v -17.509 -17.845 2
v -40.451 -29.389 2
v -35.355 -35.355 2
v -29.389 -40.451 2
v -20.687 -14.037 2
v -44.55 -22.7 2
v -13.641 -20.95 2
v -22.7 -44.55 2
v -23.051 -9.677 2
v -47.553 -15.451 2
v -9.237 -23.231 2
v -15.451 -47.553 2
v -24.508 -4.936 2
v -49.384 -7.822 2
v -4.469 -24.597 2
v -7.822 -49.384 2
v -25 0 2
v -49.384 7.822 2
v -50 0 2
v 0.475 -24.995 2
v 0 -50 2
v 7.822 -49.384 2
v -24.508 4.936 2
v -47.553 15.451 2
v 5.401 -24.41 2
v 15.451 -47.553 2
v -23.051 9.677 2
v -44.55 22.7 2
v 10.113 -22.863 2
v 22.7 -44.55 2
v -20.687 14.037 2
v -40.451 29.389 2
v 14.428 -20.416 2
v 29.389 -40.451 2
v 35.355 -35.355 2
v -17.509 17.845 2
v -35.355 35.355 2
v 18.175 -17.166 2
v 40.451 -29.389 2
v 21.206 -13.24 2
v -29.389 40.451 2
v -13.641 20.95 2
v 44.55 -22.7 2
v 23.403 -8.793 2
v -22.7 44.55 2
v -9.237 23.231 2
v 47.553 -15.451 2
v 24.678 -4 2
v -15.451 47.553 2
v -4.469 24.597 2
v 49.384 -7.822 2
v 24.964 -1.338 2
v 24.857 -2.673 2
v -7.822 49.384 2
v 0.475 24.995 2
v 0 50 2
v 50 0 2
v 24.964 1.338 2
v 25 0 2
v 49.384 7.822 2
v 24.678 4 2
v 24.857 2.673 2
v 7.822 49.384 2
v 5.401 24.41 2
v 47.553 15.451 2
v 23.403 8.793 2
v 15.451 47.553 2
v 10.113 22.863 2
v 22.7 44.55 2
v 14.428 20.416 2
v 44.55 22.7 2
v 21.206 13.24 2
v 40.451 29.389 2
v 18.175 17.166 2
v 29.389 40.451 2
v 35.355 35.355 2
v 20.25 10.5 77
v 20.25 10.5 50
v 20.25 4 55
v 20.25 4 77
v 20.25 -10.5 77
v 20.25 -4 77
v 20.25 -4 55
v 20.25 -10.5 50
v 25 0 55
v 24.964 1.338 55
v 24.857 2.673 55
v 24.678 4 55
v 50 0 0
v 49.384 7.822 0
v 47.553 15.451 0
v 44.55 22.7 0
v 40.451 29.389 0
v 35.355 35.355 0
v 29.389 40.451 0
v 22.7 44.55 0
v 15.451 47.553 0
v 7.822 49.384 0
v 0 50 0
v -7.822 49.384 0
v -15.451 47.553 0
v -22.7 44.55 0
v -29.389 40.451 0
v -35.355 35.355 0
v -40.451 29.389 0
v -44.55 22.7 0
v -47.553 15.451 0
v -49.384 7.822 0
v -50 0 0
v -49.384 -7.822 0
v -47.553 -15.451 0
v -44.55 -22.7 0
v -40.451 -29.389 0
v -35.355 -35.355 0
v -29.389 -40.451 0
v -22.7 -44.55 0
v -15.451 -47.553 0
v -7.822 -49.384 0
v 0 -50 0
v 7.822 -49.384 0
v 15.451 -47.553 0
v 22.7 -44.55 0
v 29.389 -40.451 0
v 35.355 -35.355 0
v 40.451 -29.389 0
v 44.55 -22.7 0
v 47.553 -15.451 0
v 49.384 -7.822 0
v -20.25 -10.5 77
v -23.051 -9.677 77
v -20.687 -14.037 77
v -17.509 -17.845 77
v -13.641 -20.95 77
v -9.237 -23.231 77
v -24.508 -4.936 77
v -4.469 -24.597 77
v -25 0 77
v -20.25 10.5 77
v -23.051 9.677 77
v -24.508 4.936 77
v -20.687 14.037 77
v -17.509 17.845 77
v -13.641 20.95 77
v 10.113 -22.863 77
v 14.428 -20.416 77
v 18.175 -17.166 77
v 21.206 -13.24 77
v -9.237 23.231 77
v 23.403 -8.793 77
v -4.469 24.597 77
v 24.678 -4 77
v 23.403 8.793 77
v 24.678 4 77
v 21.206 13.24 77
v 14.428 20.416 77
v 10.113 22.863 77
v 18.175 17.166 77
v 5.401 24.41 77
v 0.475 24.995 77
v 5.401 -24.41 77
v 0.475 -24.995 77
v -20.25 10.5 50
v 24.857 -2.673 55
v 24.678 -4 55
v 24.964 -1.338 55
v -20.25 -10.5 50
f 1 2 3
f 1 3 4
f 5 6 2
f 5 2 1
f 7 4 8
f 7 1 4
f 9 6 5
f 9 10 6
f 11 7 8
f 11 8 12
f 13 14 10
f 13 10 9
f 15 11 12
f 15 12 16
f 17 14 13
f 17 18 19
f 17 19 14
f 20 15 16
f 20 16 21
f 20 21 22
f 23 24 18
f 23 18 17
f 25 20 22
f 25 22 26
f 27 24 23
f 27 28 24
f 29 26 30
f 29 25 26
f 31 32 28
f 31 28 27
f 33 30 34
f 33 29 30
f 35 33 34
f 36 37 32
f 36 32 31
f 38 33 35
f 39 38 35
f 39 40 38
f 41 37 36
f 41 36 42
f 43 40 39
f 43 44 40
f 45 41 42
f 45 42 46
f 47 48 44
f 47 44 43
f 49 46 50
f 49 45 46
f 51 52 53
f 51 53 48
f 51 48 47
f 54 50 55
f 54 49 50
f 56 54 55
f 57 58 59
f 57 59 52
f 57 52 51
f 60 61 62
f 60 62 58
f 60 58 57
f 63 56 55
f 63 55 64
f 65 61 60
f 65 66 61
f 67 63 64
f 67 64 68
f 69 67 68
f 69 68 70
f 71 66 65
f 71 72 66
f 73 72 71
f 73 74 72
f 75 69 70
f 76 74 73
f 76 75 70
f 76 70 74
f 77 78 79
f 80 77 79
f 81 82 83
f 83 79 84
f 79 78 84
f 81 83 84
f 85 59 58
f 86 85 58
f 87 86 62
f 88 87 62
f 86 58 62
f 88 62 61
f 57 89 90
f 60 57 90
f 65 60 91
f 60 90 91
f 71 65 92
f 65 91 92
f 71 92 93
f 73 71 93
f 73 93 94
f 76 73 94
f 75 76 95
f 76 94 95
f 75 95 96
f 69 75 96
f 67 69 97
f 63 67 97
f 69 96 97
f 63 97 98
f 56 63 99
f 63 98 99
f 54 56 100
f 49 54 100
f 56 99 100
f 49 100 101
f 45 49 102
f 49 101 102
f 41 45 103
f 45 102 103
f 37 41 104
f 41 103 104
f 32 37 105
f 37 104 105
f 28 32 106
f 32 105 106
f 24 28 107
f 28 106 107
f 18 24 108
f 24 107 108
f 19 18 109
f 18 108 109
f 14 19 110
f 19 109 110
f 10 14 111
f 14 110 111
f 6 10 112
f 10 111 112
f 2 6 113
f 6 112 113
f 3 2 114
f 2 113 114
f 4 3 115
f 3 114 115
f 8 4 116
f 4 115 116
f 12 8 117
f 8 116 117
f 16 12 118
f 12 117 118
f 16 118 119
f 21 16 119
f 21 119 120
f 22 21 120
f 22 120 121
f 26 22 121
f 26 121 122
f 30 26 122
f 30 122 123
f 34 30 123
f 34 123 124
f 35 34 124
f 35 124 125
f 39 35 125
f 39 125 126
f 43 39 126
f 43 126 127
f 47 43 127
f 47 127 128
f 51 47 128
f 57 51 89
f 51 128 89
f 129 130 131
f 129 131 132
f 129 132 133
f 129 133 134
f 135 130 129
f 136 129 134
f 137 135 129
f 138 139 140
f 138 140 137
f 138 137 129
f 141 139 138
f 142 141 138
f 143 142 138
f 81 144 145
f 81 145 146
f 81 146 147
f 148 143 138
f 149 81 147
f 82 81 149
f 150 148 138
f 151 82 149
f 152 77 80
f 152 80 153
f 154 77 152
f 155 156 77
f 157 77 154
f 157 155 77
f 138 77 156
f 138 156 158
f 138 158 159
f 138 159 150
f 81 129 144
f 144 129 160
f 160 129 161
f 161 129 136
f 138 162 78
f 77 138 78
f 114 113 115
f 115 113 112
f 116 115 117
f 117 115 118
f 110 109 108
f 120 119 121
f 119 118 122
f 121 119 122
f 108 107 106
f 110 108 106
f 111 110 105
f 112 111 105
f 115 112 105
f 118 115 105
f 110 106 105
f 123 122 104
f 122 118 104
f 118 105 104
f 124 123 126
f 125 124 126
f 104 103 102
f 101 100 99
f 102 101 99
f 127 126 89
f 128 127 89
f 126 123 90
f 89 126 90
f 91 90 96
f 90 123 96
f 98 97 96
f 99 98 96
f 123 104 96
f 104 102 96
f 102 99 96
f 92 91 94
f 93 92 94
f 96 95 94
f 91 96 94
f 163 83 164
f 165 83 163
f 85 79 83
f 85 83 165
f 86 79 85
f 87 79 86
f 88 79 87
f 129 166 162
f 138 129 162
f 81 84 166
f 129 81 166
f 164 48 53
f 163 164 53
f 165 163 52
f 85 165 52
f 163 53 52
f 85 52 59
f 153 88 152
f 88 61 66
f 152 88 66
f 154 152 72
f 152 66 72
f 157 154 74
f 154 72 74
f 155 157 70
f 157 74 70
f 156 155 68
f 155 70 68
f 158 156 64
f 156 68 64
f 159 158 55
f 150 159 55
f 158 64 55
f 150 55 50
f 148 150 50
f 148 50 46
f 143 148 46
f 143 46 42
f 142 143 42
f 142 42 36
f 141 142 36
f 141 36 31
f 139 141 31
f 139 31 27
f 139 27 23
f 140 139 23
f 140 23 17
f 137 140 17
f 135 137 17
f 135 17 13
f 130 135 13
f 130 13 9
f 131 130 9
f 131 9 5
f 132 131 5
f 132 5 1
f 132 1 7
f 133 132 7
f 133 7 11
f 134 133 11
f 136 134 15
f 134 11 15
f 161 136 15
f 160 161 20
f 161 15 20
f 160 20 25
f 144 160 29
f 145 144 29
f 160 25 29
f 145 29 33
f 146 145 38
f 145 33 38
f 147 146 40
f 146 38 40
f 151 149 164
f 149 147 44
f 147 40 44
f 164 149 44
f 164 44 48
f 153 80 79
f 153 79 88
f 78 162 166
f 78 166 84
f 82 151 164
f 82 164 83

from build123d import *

# Parameters (mm, degrees)
SKETCH1_R           = 50
SKETCH1_R_2         = 25
BOSS_EXTRUDE1_DEPTH = 2
SKETCH1_3_W         = 40.5
SKETCH1_3_H         = 21
BOSS_EXTRUDE2_DEPTH = 50
BOSS_EXTRUDE3_DEPTH = 77
BOSS_EXTRUDE7_DEPTH = 55


with BuildPart() as part:
    # Sketch1 → Boss-Extrude1 (new body)
    with BuildSketch(Plane.XY):
        Circle(SKETCH1_R)
        Circle(SKETCH1_R_2, mode=Mode.SUBTRACT)
    extrude(amount=BOSS_EXTRUDE1_DEPTH)



with BuildPart() as body_2:
    # Sketch1<3> → Boss-Extrude2 (new body)
    with BuildSketch(Plane.XY):
        Rectangle(SKETCH1_3_W, SKETCH1_3_H)
    extrude(amount=BOSS_EXTRUDE2_DEPTH)


with BuildPart() as part_1:
    add(part.part)

    add(body_2.part)  # Boss-Extrude3 merges body 2
    # Sketch1<4> → Boss-Extrude3 (add)
    with BuildSketch(Plane.XY):
        with BuildLine():
            Line((-20.25, -10.5), (-20.25, 10.5))
            Line((-20.25, 10.5), (20.25, 10.5))
            Line((20.25, 10.5), (20.25, 4))
            Line((20.25, 4), (24.677925359, 4))
            ThreePointArc((24.677925359, 4), (-25, 0), (24.677925359, -4))
            Line((24.677925359, -4), (20.25, -4))
            Line((20.25, -4), (20.25, -10.5))
            Line((20.25, -10.5), (-20.25, -10.5))
        make_face()
    extrude(amount=BOSS_EXTRUDE3_DEPTH)

    # Sketch1<7> → Boss-Extrude7 (add)
    with BuildSketch(Plane.XY):
        with BuildLine():
            Line((24.677925359, 4), (20.25, 4))
            Line((20.25, 4), (20.25, -4))
            Line((20.25, -4), (24.677925359, -4))
            ThreePointArc((24.677925359, -4), (24.919351255, -2.00647278), (25, 0))
            ThreePointArc((25, 0), (24.919351255, 2.00647278), (24.677925359, 4))
        make_face()
    extrude(amount=BOSS_EXTRUDE7_DEPTH)


solid = part_1.part
